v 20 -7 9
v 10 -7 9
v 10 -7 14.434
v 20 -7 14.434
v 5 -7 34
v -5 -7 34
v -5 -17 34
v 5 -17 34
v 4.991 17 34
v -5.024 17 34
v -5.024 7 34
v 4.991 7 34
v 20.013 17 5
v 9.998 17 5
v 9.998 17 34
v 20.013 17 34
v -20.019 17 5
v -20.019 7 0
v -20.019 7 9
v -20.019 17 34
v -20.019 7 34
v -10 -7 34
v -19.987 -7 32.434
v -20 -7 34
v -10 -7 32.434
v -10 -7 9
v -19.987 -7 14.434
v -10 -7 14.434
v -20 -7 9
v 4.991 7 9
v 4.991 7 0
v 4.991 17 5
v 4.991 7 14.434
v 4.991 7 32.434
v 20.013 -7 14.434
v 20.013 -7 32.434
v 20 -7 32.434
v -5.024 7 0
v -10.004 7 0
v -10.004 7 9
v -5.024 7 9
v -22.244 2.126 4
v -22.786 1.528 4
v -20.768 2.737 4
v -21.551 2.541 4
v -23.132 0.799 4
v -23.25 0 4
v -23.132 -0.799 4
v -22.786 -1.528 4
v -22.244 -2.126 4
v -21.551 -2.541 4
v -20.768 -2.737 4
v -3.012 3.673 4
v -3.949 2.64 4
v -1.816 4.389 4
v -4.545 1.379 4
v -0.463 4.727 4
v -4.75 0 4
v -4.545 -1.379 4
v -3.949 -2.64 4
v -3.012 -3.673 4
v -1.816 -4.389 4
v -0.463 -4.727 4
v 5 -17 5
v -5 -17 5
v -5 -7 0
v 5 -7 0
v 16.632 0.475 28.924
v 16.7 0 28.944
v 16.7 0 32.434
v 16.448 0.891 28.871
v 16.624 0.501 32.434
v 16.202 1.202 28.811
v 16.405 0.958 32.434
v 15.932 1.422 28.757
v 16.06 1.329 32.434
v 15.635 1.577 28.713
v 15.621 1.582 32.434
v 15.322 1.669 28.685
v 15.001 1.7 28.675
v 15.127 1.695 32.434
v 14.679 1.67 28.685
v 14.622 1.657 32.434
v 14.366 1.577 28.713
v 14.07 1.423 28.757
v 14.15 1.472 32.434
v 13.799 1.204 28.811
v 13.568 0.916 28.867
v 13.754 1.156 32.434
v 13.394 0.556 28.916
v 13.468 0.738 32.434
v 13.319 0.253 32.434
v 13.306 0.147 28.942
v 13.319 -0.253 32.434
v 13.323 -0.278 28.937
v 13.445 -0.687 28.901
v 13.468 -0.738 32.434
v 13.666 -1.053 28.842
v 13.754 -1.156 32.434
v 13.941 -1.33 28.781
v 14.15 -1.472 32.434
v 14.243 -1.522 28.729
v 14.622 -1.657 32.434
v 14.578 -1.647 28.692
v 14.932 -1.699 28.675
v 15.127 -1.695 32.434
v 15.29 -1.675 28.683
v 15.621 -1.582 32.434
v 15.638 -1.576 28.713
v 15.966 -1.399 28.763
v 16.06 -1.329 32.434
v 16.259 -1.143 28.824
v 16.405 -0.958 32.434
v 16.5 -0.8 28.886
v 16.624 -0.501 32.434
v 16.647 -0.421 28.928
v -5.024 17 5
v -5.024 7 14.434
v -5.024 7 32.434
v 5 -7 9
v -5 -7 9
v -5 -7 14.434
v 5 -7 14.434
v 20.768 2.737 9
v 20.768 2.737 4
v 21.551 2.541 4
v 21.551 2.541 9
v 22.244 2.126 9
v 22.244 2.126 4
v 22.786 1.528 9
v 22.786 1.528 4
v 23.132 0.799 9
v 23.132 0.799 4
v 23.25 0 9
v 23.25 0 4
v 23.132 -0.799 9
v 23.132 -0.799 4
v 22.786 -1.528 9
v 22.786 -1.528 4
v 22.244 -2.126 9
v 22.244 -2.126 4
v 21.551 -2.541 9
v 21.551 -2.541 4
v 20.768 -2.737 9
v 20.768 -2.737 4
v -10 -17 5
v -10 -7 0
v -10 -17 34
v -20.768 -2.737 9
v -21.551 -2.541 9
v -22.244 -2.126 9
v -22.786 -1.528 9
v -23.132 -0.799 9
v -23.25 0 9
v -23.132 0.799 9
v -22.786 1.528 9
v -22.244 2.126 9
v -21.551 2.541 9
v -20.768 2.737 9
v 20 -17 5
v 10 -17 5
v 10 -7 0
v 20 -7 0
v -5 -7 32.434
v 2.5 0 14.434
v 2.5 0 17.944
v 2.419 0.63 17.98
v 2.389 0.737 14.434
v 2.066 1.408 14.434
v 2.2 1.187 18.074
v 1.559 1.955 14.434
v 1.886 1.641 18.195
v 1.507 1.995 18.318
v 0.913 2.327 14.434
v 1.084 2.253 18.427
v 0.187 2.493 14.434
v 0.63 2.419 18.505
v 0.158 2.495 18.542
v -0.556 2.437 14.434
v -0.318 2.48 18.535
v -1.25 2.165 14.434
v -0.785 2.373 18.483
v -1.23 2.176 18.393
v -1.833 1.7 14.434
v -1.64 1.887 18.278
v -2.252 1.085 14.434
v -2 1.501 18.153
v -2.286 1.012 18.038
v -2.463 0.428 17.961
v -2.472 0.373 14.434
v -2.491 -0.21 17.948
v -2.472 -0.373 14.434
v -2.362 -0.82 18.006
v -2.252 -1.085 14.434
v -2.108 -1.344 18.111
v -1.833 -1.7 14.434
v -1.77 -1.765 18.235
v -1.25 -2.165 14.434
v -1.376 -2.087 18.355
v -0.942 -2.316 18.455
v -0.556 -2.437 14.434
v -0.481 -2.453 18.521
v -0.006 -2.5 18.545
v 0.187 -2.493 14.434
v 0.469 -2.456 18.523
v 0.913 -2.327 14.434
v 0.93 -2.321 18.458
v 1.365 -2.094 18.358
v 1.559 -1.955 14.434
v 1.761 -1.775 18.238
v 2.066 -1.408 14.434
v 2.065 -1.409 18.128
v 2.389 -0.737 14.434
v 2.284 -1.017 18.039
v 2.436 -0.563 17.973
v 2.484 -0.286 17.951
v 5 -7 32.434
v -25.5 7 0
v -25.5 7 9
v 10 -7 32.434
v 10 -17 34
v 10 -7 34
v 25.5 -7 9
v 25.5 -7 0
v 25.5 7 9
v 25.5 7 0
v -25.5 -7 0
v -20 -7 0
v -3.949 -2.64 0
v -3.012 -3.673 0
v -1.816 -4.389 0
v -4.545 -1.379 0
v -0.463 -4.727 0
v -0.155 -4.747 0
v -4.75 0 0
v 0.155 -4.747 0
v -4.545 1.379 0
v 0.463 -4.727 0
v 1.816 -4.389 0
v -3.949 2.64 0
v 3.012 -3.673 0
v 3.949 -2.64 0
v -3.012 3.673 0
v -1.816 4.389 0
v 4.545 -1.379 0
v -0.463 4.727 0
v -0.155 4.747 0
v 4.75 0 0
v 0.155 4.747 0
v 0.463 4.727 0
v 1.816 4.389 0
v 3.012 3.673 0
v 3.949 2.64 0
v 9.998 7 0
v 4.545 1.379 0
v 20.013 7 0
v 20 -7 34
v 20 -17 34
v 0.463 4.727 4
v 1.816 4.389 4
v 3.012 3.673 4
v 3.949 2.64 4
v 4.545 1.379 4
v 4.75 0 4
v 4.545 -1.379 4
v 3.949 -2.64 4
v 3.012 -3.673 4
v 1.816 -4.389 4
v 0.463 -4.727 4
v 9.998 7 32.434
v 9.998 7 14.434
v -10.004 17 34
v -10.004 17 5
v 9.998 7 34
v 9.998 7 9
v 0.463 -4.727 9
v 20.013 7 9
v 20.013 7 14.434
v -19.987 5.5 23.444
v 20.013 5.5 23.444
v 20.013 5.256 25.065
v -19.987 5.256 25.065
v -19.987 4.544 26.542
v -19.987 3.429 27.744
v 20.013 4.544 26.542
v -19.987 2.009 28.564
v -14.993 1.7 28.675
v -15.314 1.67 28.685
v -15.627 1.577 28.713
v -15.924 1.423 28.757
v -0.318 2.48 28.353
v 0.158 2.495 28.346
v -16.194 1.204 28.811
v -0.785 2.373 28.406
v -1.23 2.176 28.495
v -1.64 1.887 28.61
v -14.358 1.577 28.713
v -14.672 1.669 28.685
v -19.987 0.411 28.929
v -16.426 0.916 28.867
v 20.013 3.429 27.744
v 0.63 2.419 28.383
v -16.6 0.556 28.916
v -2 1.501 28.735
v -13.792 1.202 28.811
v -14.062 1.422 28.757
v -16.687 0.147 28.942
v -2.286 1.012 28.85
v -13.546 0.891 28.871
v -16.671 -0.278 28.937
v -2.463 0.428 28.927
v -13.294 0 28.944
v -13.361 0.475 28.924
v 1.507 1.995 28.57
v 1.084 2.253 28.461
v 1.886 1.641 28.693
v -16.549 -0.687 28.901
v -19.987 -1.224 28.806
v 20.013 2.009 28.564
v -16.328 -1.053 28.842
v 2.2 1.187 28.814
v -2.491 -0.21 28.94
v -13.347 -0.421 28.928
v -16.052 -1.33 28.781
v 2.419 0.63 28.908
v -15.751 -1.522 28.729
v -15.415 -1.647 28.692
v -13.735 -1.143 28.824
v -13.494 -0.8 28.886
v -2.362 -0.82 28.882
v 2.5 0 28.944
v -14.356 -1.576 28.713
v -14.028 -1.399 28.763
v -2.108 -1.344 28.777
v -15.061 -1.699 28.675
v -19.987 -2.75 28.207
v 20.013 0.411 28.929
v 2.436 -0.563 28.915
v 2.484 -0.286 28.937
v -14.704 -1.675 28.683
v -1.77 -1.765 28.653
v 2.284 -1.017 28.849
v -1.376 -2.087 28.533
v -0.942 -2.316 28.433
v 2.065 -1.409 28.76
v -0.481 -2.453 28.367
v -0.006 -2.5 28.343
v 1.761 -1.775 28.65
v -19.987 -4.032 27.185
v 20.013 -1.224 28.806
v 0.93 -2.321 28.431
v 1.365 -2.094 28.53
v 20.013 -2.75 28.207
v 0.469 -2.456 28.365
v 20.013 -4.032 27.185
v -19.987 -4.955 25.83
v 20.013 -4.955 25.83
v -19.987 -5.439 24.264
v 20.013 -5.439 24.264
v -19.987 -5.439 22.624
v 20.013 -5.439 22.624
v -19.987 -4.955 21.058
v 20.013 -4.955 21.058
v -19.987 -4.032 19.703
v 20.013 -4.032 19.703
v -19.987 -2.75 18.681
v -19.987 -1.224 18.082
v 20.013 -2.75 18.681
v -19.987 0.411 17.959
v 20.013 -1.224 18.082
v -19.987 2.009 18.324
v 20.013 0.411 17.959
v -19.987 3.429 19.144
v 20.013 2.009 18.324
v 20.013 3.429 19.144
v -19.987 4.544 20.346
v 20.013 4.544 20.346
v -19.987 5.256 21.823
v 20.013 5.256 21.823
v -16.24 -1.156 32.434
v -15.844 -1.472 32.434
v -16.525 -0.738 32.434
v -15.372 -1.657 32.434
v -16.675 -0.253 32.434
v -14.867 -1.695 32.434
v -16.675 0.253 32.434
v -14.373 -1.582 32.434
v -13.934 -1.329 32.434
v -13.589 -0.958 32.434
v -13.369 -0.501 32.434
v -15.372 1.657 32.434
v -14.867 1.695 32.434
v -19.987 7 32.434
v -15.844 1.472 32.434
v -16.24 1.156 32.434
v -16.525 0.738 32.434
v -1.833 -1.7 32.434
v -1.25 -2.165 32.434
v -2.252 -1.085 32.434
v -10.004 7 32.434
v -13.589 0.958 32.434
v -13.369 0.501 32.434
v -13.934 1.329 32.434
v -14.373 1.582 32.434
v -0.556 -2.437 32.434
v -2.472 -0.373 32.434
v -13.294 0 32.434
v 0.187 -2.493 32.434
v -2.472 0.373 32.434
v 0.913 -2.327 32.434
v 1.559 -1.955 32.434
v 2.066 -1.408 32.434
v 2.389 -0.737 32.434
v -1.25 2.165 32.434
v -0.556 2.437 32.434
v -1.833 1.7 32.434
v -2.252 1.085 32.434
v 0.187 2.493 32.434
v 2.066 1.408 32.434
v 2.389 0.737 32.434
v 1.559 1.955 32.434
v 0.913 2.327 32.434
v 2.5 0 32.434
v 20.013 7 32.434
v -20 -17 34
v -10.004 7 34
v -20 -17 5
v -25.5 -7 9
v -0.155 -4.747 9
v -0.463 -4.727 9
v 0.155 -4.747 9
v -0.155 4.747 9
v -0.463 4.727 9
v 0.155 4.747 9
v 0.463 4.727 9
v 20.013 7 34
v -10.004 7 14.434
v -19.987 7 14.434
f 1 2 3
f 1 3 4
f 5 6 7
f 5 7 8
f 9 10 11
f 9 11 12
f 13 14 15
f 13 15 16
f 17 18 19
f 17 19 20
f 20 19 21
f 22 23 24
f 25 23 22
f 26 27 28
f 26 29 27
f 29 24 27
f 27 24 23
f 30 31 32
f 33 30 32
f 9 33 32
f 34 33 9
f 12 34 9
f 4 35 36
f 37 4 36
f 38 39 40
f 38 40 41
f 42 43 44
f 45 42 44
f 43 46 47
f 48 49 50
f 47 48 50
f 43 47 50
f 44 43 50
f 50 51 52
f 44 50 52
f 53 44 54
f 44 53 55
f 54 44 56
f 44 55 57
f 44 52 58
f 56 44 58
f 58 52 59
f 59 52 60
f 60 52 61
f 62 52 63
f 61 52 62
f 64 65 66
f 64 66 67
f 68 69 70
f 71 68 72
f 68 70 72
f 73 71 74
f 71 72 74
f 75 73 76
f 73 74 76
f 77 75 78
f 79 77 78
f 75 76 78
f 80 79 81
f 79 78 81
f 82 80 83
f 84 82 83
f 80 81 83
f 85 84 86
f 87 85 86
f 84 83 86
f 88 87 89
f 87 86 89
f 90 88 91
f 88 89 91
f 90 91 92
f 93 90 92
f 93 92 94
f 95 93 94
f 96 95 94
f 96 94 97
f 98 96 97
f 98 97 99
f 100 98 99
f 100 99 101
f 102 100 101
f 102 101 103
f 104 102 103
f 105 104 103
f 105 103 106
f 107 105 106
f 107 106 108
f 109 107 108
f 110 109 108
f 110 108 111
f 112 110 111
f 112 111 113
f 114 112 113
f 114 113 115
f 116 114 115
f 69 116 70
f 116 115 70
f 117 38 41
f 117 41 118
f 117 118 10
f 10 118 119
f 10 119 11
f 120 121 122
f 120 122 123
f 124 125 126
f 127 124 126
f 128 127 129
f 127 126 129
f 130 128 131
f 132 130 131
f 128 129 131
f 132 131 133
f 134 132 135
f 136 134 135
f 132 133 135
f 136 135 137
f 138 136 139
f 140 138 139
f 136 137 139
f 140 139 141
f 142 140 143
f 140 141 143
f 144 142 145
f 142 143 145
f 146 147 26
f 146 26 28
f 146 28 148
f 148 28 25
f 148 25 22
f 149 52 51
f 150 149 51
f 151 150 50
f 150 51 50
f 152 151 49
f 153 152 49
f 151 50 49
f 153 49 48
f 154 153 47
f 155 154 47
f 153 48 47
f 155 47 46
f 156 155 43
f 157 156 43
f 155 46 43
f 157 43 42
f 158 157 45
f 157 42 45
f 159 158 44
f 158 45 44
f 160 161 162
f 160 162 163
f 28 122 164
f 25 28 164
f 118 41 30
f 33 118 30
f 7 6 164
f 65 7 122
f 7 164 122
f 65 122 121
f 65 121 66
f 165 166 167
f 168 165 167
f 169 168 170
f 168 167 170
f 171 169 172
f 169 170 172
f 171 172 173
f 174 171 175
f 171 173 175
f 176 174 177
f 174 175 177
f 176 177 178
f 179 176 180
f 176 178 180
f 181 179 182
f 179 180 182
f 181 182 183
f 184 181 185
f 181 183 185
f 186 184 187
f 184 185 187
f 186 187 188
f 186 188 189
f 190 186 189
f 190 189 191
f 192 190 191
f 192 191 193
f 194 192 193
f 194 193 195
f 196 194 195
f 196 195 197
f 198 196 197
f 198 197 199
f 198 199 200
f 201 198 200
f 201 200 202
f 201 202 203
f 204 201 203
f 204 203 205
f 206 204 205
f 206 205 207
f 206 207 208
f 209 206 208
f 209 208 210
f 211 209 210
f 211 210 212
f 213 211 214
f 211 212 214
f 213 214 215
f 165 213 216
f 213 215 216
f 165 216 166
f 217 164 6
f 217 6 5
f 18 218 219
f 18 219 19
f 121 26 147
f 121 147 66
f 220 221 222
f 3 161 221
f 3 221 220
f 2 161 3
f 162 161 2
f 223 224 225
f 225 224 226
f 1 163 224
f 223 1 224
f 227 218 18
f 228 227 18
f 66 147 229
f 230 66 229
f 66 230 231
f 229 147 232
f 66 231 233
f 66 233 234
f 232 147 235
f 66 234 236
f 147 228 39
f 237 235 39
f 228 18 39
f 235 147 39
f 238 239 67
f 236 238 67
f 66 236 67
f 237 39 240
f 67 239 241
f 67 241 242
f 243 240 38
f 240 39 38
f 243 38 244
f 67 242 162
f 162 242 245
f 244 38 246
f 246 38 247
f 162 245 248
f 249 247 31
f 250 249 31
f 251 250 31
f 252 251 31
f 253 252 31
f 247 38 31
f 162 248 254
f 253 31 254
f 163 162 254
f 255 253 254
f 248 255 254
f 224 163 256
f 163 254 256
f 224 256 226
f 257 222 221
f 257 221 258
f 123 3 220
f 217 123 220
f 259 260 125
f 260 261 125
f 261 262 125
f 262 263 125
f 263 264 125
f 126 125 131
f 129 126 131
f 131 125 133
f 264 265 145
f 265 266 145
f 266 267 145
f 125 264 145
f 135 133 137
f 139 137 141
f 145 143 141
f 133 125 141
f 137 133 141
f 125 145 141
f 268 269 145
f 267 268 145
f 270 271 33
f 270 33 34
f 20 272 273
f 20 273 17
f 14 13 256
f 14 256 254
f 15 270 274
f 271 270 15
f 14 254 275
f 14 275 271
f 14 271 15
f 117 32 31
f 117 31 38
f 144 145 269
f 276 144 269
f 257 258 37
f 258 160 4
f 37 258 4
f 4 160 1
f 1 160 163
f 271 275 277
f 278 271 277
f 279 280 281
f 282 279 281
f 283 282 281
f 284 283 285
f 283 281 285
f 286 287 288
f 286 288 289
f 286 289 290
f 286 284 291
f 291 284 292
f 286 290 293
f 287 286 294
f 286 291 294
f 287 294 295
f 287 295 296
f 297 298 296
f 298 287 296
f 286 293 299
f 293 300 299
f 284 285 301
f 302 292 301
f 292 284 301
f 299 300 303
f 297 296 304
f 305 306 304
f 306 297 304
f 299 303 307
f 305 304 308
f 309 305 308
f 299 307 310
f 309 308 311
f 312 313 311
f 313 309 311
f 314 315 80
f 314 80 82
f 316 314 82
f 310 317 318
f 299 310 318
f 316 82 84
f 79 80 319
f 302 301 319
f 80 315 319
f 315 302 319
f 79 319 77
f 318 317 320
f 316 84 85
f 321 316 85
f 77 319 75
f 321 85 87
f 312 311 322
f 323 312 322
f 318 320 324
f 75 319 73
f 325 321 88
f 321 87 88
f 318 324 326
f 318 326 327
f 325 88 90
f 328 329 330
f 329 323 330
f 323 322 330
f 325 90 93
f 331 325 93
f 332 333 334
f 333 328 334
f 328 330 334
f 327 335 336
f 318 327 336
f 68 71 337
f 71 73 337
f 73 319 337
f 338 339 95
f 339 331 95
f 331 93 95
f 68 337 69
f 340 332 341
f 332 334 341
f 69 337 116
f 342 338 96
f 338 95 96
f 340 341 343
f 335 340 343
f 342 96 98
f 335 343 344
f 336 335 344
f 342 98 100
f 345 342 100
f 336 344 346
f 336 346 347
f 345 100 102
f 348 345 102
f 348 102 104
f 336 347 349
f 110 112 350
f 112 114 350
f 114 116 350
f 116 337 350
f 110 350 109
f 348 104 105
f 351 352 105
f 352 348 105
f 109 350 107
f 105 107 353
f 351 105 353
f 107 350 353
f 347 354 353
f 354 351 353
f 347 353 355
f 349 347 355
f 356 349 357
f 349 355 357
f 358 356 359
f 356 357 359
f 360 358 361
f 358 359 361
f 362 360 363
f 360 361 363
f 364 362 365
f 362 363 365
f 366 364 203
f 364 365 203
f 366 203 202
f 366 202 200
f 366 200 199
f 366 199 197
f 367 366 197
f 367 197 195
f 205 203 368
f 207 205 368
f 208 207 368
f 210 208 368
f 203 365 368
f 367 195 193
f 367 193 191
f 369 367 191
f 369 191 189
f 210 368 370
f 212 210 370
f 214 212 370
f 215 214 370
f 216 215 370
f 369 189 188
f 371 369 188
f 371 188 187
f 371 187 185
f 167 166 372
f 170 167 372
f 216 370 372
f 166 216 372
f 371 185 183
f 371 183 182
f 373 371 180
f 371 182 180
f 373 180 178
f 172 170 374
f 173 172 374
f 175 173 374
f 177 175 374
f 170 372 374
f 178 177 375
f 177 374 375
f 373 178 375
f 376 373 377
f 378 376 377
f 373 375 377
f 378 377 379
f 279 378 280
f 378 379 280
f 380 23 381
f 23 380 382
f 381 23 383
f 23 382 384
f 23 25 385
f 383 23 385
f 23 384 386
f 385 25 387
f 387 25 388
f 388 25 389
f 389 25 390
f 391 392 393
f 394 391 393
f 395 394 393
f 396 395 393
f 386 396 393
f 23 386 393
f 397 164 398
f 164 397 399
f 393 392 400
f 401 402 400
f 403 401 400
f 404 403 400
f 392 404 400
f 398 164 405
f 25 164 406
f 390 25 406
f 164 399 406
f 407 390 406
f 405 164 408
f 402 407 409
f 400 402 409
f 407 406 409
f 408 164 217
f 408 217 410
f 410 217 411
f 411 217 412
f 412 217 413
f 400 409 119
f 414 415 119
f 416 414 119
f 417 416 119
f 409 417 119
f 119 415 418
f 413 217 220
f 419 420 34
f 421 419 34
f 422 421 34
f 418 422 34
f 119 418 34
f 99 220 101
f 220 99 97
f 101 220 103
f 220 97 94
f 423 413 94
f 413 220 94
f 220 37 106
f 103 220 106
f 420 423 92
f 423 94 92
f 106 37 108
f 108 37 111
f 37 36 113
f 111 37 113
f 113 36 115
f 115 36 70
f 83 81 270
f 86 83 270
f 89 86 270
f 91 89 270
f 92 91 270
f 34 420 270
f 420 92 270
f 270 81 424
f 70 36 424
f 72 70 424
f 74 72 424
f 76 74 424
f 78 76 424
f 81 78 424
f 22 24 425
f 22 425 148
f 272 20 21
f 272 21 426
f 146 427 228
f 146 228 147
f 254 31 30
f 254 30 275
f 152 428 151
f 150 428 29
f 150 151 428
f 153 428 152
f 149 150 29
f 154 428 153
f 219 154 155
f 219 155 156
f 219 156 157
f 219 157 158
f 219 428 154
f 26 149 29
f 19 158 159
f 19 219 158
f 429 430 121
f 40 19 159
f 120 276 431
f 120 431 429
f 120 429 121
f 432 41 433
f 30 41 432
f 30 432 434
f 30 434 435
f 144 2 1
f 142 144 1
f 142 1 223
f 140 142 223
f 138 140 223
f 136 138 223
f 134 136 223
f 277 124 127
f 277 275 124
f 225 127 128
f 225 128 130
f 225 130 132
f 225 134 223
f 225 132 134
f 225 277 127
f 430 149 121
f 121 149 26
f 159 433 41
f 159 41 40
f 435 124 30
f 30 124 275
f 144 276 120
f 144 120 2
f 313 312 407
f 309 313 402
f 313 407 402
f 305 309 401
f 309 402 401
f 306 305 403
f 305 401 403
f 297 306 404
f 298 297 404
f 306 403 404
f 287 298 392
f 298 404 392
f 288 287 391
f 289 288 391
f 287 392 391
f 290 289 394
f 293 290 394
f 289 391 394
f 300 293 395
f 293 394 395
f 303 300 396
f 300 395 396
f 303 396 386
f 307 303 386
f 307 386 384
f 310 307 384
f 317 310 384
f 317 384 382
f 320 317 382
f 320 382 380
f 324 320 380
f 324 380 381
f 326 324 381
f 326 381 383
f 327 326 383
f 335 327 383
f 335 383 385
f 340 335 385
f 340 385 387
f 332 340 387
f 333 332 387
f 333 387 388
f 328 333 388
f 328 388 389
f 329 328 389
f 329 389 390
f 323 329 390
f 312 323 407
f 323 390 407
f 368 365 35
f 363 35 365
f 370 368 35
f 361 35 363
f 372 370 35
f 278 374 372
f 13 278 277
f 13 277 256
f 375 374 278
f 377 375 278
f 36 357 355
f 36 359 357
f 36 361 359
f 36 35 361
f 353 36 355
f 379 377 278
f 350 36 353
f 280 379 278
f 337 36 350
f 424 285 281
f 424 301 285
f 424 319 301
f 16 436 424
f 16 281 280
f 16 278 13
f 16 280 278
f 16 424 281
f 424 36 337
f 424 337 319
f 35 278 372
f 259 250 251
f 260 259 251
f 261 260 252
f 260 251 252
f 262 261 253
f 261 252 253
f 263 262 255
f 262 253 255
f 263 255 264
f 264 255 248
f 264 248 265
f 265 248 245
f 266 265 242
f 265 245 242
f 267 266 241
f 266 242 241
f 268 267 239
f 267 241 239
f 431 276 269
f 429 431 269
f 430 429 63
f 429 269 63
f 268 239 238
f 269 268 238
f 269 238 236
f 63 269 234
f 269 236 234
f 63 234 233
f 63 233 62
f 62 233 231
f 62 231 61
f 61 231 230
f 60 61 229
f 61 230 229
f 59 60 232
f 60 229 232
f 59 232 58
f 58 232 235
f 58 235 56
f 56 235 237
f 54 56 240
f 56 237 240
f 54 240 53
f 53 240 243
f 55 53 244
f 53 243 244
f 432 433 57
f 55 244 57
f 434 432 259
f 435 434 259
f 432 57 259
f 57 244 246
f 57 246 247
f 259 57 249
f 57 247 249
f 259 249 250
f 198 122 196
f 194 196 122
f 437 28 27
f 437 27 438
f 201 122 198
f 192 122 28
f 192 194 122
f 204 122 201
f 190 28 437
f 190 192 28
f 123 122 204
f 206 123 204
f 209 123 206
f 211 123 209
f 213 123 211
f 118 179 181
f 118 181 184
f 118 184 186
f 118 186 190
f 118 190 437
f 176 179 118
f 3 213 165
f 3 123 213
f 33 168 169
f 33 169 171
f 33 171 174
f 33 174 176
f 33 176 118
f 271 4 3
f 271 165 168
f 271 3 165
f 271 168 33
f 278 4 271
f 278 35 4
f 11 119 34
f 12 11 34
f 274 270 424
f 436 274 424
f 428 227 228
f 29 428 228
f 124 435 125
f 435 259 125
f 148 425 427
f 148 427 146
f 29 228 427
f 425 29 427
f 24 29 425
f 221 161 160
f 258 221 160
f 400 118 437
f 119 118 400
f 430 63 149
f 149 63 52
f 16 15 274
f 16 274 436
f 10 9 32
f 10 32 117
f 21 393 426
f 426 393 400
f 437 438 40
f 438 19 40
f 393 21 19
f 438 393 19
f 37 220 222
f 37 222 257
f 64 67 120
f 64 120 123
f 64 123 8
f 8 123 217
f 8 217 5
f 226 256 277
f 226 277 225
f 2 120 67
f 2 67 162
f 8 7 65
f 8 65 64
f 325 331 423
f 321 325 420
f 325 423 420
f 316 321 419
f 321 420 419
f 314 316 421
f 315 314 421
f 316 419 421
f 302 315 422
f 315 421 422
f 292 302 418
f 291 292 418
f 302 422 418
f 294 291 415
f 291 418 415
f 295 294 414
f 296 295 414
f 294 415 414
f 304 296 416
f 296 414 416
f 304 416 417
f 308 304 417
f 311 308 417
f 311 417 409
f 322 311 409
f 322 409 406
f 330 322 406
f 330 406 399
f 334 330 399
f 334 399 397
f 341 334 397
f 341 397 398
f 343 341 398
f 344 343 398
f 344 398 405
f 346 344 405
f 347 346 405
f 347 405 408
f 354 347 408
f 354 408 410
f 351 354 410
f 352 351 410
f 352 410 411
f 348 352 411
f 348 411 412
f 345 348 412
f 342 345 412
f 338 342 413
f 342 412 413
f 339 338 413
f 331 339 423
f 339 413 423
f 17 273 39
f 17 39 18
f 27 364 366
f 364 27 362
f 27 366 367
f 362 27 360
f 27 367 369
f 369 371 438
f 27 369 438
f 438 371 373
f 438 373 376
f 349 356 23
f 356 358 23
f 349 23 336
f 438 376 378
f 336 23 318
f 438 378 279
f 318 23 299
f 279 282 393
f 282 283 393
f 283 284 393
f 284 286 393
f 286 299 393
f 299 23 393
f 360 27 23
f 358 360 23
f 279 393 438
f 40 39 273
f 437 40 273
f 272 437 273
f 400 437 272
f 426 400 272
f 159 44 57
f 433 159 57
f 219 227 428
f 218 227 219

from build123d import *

# Parameters (mm, degrees)
F0_W      = 51
F0_H      = 14
F1_DEPTH  = 6
F2_R      = 2.5
F3_DEPTH  = 4
F6_DEPTH  = 2
F7_DEPTH  = 3
F8_W      = 10
F8_H      = 9
F9_DEPTH  = 10
F10_W     = 10
F10_H     = 10
F11_DEPTH = 25
F12_W     = 10.0145330653
F12_H     = 9
F12_W_2   = 10.0145321339
F13_DEPTH = 10
F14_W     = 10.0145330653
F14_H     = 10
F14_W_2   = 10.0145321339
F15_DEPTH = 25
F16_W     = 14
F16_H     = 18
F16_R     = 5.5
F17_DEPTH = 40
F18_R     = 1.7
F19_DEPTH = 5
F20_R     = 2.5
F21_DEPTH = 20
F22_SIZE2 = 5
F22_SIZE  = 10


with BuildPart() as f1:
    # F0 (on Top) → F1 (new body)
    with BuildSketch(Plane.XY):
        Rectangle(F0_W, F0_H)
    extrude(amount=F1_DEPTH)

    # F2 (on face) → F3 (cut)
    with BuildSketch(Plane(origin=(0, 0, 0), x_dir=(1, 0, 0), z_dir=(0, 0, -1))):
        with BuildLine():
            ThreePointArc((0.4634146341, 4.7273403597), (-4.38e-08, 4.75), (-0.4634147213, 4.7273403512))
            ThreePointArc((-0.4634147213, 4.7273403512), (-4.75, -4.38e-08), (-0.4634146341, -4.7273403597))
            ThreePointArc((-0.4634146341, -4.7273403597), (0, -4.75), (0.4634146341, -4.7273403597))
            ThreePointArc((0.4634146341, -4.7273403597), (3.5187866881, -3.1907115576), (4.75, 0))
            ThreePointArc((4.75, 0), (3.5187866881, 3.1907115576), (0.4634146341, 4.7273403597))
        make_face()
        Circle(F2_R, mode=Mode.SUBTRACT)
        Circle(F2_R)
    extrude(amount=-F3_DEPTH, mode=Mode.SUBTRACT)

    # F5 (on offset) → F6 (cut)
    with BuildSketch(Plane(origin=(0, 0, 4), x_dir=(1, 0, 0), z_dir=(0, 0, -1))):
        with BuildLine():
            Line((-0.4634146341, 4.7273403597), (-20.7682926829, 2.7368812609))
            ThreePointArc((-20.7682926829, 2.7368812609), (-23.25, 0), (-20.7682926829, -2.7368812609))
            Line((-20.7682926829, -2.7368812609), (-0.4634146341, -4.7273403597))
            ThreePointArc((-0.4634146341, -4.7273403597), (-4.75, 0), (-0.4634146341, 4.7273403597))
        make_face()
        with BuildLine():
            ThreePointArc((0.4634146341, 4.7273403597), (0, 4.75), (-0.4634146341, 4.7273403597))
            ThreePointArc((-0.4634146341, 4.7273403597), (-4.75, 0), (-0.4634146341, -4.7273403597))
            ThreePointArc((-0.4634146341, -4.7273403597), (0, -4.75), (0.4634146341, -4.7273403597))
            ThreePointArc((0.4634146341, -4.7273403597), (3.5187866881, -3.1907115576), (4.75, 0))
            ThreePointArc((4.75, 0), (3.5187866881, 3.1907115576), (0.4634146341, 4.7273403597))
        make_face()
        with BuildLine():
            Line((20.7682926829, 2.7368812609), (0.4634146341, 4.7273403597))
            ThreePointArc((0.4634146341, 4.7273403597), (3.5187866881, 3.1907115576), (4.75, 0))
            ThreePointArc((4.75, 0), (3.5187866881, -3.1907115576), (0.4634146341, -4.7273403597))
            Line((0.4634146341, -4.7273403597), (20.7682926829, -2.7368812609))
            ThreePointArc((20.7682926829, -2.7368812609), (23.25, 0), (20.7682926829, 2.7368812609))
        make_face()
    extrude(amount=-F6_DEPTH, mode=Mode.SUBTRACT)

    # F7 (add): a face of the model
    f7_faces = [f1.faces().sort_by_distance(p)[0] for p in [
        (0, 6.4711332871, 6),
    ]]
    extrude(f7_faces, amount=F7_DEPTH)

    # F8 (on face) → F9 (join)
    with BuildSketch(Plane.XZ.offset(7)):
        with Locations((15, 4.5)):
            Rectangle(F8_W, F8_H)
        with Locations((-15, 4.5)):
            Rectangle(F8_W, F8_H)
        Polygon((0, 0), (5, 0), (5, 9), (-5, 9), (-5, 0), align=None)
    extrude(amount=F9_DEPTH)

    # F10 (on face) → F11 (join)
    with BuildSketch(Plane.XY.offset(9)):
        with Locations((15, -12)):
            Rectangle(F10_W, F10_H)
        with Locations((0, -12)):
            Rectangle(F10_W, F10_H)
        with Locations((-15, -12)):
            Rectangle(F10_W, F10_H)
    extrude(amount=F11_DEPTH)

    # F12 (on face) → F13 (join)
    with BuildSketch(Plane(origin=(0, 7, 0), x_dir=(-1, 0, 0), z_dir=(0, 1, 0))):
        with Locations((-15.0052965619, 4.5)):
            Rectangle(F12_W, F12_H)
        with Locations((0.0165025704, 4.5)):
            Rectangle(F12_W_2, F12_H)
        with Locations((15.0112351403, 4.5)):
            Rectangle(F12_W_2, F12_H)
    extrude(amount=F13_DEPTH)

    # F14 (on face) → F15 (join)
    with BuildSketch(Plane.XY.offset(9)):
        with Locations((15.0052965619, 12)):
            Rectangle(F14_W, F14_H)
        with Locations((-0.0165025704, 12)):
            Rectangle(F14_W_2, F14_H)
        with Locations((-15.0112351403, 12)):
            Rectangle(F14_W_2, F14_H)
    extrude(amount=F15_DEPTH)

    # F16 (on face) → F17 (join)
    with BuildSketch(Plane.YZ.offset(20.0125630945)):
        with Locations((0, 23.4342994317)):
            Rectangle(F16_W, F16_H)
        with Locations((0, 23.444019258)):
            Circle(F16_R, mode=Mode.SUBTRACT)
    extrude(amount=-F17_DEPTH)

    # F18 (on face) → F19 (cut)
    with BuildSketch(Plane.XY.offset(32.4342994317)):
        with Locations((15, 0)):
            Circle(F18_R)
        with Locations((-14.9937184528, 0)):
            Circle(F18_R)
    extrude(amount=-F19_DEPTH, mode=Mode.SUBTRACT)

    # F20 (on face) → F21 (cut)
    with BuildSketch(Plane.XY.offset(32.4342994317)):
        Circle(F20_R)
    extrude(amount=-F21_DEPTH, mode=Mode.SUBTRACT)

    # F22
    f22_edges = [f1.edges().sort_by_distance(p)[0] for p in [
        (15.005297, 17, 0),
        (-0.016503, 17, 0),
        (-15.011235, 17, 0),
        (15, -17, 0),
        (0, -17, 0),
        (-15, -17, 0),
    ]]
    f22_side = f1.faces().sort_by_distance((22.756282, 6.387056, 0))[0]
    chamfer(f22_edges, length=F22_SIZE, length2=F22_SIZE2, reference=f22_side)


solid = f1.part
